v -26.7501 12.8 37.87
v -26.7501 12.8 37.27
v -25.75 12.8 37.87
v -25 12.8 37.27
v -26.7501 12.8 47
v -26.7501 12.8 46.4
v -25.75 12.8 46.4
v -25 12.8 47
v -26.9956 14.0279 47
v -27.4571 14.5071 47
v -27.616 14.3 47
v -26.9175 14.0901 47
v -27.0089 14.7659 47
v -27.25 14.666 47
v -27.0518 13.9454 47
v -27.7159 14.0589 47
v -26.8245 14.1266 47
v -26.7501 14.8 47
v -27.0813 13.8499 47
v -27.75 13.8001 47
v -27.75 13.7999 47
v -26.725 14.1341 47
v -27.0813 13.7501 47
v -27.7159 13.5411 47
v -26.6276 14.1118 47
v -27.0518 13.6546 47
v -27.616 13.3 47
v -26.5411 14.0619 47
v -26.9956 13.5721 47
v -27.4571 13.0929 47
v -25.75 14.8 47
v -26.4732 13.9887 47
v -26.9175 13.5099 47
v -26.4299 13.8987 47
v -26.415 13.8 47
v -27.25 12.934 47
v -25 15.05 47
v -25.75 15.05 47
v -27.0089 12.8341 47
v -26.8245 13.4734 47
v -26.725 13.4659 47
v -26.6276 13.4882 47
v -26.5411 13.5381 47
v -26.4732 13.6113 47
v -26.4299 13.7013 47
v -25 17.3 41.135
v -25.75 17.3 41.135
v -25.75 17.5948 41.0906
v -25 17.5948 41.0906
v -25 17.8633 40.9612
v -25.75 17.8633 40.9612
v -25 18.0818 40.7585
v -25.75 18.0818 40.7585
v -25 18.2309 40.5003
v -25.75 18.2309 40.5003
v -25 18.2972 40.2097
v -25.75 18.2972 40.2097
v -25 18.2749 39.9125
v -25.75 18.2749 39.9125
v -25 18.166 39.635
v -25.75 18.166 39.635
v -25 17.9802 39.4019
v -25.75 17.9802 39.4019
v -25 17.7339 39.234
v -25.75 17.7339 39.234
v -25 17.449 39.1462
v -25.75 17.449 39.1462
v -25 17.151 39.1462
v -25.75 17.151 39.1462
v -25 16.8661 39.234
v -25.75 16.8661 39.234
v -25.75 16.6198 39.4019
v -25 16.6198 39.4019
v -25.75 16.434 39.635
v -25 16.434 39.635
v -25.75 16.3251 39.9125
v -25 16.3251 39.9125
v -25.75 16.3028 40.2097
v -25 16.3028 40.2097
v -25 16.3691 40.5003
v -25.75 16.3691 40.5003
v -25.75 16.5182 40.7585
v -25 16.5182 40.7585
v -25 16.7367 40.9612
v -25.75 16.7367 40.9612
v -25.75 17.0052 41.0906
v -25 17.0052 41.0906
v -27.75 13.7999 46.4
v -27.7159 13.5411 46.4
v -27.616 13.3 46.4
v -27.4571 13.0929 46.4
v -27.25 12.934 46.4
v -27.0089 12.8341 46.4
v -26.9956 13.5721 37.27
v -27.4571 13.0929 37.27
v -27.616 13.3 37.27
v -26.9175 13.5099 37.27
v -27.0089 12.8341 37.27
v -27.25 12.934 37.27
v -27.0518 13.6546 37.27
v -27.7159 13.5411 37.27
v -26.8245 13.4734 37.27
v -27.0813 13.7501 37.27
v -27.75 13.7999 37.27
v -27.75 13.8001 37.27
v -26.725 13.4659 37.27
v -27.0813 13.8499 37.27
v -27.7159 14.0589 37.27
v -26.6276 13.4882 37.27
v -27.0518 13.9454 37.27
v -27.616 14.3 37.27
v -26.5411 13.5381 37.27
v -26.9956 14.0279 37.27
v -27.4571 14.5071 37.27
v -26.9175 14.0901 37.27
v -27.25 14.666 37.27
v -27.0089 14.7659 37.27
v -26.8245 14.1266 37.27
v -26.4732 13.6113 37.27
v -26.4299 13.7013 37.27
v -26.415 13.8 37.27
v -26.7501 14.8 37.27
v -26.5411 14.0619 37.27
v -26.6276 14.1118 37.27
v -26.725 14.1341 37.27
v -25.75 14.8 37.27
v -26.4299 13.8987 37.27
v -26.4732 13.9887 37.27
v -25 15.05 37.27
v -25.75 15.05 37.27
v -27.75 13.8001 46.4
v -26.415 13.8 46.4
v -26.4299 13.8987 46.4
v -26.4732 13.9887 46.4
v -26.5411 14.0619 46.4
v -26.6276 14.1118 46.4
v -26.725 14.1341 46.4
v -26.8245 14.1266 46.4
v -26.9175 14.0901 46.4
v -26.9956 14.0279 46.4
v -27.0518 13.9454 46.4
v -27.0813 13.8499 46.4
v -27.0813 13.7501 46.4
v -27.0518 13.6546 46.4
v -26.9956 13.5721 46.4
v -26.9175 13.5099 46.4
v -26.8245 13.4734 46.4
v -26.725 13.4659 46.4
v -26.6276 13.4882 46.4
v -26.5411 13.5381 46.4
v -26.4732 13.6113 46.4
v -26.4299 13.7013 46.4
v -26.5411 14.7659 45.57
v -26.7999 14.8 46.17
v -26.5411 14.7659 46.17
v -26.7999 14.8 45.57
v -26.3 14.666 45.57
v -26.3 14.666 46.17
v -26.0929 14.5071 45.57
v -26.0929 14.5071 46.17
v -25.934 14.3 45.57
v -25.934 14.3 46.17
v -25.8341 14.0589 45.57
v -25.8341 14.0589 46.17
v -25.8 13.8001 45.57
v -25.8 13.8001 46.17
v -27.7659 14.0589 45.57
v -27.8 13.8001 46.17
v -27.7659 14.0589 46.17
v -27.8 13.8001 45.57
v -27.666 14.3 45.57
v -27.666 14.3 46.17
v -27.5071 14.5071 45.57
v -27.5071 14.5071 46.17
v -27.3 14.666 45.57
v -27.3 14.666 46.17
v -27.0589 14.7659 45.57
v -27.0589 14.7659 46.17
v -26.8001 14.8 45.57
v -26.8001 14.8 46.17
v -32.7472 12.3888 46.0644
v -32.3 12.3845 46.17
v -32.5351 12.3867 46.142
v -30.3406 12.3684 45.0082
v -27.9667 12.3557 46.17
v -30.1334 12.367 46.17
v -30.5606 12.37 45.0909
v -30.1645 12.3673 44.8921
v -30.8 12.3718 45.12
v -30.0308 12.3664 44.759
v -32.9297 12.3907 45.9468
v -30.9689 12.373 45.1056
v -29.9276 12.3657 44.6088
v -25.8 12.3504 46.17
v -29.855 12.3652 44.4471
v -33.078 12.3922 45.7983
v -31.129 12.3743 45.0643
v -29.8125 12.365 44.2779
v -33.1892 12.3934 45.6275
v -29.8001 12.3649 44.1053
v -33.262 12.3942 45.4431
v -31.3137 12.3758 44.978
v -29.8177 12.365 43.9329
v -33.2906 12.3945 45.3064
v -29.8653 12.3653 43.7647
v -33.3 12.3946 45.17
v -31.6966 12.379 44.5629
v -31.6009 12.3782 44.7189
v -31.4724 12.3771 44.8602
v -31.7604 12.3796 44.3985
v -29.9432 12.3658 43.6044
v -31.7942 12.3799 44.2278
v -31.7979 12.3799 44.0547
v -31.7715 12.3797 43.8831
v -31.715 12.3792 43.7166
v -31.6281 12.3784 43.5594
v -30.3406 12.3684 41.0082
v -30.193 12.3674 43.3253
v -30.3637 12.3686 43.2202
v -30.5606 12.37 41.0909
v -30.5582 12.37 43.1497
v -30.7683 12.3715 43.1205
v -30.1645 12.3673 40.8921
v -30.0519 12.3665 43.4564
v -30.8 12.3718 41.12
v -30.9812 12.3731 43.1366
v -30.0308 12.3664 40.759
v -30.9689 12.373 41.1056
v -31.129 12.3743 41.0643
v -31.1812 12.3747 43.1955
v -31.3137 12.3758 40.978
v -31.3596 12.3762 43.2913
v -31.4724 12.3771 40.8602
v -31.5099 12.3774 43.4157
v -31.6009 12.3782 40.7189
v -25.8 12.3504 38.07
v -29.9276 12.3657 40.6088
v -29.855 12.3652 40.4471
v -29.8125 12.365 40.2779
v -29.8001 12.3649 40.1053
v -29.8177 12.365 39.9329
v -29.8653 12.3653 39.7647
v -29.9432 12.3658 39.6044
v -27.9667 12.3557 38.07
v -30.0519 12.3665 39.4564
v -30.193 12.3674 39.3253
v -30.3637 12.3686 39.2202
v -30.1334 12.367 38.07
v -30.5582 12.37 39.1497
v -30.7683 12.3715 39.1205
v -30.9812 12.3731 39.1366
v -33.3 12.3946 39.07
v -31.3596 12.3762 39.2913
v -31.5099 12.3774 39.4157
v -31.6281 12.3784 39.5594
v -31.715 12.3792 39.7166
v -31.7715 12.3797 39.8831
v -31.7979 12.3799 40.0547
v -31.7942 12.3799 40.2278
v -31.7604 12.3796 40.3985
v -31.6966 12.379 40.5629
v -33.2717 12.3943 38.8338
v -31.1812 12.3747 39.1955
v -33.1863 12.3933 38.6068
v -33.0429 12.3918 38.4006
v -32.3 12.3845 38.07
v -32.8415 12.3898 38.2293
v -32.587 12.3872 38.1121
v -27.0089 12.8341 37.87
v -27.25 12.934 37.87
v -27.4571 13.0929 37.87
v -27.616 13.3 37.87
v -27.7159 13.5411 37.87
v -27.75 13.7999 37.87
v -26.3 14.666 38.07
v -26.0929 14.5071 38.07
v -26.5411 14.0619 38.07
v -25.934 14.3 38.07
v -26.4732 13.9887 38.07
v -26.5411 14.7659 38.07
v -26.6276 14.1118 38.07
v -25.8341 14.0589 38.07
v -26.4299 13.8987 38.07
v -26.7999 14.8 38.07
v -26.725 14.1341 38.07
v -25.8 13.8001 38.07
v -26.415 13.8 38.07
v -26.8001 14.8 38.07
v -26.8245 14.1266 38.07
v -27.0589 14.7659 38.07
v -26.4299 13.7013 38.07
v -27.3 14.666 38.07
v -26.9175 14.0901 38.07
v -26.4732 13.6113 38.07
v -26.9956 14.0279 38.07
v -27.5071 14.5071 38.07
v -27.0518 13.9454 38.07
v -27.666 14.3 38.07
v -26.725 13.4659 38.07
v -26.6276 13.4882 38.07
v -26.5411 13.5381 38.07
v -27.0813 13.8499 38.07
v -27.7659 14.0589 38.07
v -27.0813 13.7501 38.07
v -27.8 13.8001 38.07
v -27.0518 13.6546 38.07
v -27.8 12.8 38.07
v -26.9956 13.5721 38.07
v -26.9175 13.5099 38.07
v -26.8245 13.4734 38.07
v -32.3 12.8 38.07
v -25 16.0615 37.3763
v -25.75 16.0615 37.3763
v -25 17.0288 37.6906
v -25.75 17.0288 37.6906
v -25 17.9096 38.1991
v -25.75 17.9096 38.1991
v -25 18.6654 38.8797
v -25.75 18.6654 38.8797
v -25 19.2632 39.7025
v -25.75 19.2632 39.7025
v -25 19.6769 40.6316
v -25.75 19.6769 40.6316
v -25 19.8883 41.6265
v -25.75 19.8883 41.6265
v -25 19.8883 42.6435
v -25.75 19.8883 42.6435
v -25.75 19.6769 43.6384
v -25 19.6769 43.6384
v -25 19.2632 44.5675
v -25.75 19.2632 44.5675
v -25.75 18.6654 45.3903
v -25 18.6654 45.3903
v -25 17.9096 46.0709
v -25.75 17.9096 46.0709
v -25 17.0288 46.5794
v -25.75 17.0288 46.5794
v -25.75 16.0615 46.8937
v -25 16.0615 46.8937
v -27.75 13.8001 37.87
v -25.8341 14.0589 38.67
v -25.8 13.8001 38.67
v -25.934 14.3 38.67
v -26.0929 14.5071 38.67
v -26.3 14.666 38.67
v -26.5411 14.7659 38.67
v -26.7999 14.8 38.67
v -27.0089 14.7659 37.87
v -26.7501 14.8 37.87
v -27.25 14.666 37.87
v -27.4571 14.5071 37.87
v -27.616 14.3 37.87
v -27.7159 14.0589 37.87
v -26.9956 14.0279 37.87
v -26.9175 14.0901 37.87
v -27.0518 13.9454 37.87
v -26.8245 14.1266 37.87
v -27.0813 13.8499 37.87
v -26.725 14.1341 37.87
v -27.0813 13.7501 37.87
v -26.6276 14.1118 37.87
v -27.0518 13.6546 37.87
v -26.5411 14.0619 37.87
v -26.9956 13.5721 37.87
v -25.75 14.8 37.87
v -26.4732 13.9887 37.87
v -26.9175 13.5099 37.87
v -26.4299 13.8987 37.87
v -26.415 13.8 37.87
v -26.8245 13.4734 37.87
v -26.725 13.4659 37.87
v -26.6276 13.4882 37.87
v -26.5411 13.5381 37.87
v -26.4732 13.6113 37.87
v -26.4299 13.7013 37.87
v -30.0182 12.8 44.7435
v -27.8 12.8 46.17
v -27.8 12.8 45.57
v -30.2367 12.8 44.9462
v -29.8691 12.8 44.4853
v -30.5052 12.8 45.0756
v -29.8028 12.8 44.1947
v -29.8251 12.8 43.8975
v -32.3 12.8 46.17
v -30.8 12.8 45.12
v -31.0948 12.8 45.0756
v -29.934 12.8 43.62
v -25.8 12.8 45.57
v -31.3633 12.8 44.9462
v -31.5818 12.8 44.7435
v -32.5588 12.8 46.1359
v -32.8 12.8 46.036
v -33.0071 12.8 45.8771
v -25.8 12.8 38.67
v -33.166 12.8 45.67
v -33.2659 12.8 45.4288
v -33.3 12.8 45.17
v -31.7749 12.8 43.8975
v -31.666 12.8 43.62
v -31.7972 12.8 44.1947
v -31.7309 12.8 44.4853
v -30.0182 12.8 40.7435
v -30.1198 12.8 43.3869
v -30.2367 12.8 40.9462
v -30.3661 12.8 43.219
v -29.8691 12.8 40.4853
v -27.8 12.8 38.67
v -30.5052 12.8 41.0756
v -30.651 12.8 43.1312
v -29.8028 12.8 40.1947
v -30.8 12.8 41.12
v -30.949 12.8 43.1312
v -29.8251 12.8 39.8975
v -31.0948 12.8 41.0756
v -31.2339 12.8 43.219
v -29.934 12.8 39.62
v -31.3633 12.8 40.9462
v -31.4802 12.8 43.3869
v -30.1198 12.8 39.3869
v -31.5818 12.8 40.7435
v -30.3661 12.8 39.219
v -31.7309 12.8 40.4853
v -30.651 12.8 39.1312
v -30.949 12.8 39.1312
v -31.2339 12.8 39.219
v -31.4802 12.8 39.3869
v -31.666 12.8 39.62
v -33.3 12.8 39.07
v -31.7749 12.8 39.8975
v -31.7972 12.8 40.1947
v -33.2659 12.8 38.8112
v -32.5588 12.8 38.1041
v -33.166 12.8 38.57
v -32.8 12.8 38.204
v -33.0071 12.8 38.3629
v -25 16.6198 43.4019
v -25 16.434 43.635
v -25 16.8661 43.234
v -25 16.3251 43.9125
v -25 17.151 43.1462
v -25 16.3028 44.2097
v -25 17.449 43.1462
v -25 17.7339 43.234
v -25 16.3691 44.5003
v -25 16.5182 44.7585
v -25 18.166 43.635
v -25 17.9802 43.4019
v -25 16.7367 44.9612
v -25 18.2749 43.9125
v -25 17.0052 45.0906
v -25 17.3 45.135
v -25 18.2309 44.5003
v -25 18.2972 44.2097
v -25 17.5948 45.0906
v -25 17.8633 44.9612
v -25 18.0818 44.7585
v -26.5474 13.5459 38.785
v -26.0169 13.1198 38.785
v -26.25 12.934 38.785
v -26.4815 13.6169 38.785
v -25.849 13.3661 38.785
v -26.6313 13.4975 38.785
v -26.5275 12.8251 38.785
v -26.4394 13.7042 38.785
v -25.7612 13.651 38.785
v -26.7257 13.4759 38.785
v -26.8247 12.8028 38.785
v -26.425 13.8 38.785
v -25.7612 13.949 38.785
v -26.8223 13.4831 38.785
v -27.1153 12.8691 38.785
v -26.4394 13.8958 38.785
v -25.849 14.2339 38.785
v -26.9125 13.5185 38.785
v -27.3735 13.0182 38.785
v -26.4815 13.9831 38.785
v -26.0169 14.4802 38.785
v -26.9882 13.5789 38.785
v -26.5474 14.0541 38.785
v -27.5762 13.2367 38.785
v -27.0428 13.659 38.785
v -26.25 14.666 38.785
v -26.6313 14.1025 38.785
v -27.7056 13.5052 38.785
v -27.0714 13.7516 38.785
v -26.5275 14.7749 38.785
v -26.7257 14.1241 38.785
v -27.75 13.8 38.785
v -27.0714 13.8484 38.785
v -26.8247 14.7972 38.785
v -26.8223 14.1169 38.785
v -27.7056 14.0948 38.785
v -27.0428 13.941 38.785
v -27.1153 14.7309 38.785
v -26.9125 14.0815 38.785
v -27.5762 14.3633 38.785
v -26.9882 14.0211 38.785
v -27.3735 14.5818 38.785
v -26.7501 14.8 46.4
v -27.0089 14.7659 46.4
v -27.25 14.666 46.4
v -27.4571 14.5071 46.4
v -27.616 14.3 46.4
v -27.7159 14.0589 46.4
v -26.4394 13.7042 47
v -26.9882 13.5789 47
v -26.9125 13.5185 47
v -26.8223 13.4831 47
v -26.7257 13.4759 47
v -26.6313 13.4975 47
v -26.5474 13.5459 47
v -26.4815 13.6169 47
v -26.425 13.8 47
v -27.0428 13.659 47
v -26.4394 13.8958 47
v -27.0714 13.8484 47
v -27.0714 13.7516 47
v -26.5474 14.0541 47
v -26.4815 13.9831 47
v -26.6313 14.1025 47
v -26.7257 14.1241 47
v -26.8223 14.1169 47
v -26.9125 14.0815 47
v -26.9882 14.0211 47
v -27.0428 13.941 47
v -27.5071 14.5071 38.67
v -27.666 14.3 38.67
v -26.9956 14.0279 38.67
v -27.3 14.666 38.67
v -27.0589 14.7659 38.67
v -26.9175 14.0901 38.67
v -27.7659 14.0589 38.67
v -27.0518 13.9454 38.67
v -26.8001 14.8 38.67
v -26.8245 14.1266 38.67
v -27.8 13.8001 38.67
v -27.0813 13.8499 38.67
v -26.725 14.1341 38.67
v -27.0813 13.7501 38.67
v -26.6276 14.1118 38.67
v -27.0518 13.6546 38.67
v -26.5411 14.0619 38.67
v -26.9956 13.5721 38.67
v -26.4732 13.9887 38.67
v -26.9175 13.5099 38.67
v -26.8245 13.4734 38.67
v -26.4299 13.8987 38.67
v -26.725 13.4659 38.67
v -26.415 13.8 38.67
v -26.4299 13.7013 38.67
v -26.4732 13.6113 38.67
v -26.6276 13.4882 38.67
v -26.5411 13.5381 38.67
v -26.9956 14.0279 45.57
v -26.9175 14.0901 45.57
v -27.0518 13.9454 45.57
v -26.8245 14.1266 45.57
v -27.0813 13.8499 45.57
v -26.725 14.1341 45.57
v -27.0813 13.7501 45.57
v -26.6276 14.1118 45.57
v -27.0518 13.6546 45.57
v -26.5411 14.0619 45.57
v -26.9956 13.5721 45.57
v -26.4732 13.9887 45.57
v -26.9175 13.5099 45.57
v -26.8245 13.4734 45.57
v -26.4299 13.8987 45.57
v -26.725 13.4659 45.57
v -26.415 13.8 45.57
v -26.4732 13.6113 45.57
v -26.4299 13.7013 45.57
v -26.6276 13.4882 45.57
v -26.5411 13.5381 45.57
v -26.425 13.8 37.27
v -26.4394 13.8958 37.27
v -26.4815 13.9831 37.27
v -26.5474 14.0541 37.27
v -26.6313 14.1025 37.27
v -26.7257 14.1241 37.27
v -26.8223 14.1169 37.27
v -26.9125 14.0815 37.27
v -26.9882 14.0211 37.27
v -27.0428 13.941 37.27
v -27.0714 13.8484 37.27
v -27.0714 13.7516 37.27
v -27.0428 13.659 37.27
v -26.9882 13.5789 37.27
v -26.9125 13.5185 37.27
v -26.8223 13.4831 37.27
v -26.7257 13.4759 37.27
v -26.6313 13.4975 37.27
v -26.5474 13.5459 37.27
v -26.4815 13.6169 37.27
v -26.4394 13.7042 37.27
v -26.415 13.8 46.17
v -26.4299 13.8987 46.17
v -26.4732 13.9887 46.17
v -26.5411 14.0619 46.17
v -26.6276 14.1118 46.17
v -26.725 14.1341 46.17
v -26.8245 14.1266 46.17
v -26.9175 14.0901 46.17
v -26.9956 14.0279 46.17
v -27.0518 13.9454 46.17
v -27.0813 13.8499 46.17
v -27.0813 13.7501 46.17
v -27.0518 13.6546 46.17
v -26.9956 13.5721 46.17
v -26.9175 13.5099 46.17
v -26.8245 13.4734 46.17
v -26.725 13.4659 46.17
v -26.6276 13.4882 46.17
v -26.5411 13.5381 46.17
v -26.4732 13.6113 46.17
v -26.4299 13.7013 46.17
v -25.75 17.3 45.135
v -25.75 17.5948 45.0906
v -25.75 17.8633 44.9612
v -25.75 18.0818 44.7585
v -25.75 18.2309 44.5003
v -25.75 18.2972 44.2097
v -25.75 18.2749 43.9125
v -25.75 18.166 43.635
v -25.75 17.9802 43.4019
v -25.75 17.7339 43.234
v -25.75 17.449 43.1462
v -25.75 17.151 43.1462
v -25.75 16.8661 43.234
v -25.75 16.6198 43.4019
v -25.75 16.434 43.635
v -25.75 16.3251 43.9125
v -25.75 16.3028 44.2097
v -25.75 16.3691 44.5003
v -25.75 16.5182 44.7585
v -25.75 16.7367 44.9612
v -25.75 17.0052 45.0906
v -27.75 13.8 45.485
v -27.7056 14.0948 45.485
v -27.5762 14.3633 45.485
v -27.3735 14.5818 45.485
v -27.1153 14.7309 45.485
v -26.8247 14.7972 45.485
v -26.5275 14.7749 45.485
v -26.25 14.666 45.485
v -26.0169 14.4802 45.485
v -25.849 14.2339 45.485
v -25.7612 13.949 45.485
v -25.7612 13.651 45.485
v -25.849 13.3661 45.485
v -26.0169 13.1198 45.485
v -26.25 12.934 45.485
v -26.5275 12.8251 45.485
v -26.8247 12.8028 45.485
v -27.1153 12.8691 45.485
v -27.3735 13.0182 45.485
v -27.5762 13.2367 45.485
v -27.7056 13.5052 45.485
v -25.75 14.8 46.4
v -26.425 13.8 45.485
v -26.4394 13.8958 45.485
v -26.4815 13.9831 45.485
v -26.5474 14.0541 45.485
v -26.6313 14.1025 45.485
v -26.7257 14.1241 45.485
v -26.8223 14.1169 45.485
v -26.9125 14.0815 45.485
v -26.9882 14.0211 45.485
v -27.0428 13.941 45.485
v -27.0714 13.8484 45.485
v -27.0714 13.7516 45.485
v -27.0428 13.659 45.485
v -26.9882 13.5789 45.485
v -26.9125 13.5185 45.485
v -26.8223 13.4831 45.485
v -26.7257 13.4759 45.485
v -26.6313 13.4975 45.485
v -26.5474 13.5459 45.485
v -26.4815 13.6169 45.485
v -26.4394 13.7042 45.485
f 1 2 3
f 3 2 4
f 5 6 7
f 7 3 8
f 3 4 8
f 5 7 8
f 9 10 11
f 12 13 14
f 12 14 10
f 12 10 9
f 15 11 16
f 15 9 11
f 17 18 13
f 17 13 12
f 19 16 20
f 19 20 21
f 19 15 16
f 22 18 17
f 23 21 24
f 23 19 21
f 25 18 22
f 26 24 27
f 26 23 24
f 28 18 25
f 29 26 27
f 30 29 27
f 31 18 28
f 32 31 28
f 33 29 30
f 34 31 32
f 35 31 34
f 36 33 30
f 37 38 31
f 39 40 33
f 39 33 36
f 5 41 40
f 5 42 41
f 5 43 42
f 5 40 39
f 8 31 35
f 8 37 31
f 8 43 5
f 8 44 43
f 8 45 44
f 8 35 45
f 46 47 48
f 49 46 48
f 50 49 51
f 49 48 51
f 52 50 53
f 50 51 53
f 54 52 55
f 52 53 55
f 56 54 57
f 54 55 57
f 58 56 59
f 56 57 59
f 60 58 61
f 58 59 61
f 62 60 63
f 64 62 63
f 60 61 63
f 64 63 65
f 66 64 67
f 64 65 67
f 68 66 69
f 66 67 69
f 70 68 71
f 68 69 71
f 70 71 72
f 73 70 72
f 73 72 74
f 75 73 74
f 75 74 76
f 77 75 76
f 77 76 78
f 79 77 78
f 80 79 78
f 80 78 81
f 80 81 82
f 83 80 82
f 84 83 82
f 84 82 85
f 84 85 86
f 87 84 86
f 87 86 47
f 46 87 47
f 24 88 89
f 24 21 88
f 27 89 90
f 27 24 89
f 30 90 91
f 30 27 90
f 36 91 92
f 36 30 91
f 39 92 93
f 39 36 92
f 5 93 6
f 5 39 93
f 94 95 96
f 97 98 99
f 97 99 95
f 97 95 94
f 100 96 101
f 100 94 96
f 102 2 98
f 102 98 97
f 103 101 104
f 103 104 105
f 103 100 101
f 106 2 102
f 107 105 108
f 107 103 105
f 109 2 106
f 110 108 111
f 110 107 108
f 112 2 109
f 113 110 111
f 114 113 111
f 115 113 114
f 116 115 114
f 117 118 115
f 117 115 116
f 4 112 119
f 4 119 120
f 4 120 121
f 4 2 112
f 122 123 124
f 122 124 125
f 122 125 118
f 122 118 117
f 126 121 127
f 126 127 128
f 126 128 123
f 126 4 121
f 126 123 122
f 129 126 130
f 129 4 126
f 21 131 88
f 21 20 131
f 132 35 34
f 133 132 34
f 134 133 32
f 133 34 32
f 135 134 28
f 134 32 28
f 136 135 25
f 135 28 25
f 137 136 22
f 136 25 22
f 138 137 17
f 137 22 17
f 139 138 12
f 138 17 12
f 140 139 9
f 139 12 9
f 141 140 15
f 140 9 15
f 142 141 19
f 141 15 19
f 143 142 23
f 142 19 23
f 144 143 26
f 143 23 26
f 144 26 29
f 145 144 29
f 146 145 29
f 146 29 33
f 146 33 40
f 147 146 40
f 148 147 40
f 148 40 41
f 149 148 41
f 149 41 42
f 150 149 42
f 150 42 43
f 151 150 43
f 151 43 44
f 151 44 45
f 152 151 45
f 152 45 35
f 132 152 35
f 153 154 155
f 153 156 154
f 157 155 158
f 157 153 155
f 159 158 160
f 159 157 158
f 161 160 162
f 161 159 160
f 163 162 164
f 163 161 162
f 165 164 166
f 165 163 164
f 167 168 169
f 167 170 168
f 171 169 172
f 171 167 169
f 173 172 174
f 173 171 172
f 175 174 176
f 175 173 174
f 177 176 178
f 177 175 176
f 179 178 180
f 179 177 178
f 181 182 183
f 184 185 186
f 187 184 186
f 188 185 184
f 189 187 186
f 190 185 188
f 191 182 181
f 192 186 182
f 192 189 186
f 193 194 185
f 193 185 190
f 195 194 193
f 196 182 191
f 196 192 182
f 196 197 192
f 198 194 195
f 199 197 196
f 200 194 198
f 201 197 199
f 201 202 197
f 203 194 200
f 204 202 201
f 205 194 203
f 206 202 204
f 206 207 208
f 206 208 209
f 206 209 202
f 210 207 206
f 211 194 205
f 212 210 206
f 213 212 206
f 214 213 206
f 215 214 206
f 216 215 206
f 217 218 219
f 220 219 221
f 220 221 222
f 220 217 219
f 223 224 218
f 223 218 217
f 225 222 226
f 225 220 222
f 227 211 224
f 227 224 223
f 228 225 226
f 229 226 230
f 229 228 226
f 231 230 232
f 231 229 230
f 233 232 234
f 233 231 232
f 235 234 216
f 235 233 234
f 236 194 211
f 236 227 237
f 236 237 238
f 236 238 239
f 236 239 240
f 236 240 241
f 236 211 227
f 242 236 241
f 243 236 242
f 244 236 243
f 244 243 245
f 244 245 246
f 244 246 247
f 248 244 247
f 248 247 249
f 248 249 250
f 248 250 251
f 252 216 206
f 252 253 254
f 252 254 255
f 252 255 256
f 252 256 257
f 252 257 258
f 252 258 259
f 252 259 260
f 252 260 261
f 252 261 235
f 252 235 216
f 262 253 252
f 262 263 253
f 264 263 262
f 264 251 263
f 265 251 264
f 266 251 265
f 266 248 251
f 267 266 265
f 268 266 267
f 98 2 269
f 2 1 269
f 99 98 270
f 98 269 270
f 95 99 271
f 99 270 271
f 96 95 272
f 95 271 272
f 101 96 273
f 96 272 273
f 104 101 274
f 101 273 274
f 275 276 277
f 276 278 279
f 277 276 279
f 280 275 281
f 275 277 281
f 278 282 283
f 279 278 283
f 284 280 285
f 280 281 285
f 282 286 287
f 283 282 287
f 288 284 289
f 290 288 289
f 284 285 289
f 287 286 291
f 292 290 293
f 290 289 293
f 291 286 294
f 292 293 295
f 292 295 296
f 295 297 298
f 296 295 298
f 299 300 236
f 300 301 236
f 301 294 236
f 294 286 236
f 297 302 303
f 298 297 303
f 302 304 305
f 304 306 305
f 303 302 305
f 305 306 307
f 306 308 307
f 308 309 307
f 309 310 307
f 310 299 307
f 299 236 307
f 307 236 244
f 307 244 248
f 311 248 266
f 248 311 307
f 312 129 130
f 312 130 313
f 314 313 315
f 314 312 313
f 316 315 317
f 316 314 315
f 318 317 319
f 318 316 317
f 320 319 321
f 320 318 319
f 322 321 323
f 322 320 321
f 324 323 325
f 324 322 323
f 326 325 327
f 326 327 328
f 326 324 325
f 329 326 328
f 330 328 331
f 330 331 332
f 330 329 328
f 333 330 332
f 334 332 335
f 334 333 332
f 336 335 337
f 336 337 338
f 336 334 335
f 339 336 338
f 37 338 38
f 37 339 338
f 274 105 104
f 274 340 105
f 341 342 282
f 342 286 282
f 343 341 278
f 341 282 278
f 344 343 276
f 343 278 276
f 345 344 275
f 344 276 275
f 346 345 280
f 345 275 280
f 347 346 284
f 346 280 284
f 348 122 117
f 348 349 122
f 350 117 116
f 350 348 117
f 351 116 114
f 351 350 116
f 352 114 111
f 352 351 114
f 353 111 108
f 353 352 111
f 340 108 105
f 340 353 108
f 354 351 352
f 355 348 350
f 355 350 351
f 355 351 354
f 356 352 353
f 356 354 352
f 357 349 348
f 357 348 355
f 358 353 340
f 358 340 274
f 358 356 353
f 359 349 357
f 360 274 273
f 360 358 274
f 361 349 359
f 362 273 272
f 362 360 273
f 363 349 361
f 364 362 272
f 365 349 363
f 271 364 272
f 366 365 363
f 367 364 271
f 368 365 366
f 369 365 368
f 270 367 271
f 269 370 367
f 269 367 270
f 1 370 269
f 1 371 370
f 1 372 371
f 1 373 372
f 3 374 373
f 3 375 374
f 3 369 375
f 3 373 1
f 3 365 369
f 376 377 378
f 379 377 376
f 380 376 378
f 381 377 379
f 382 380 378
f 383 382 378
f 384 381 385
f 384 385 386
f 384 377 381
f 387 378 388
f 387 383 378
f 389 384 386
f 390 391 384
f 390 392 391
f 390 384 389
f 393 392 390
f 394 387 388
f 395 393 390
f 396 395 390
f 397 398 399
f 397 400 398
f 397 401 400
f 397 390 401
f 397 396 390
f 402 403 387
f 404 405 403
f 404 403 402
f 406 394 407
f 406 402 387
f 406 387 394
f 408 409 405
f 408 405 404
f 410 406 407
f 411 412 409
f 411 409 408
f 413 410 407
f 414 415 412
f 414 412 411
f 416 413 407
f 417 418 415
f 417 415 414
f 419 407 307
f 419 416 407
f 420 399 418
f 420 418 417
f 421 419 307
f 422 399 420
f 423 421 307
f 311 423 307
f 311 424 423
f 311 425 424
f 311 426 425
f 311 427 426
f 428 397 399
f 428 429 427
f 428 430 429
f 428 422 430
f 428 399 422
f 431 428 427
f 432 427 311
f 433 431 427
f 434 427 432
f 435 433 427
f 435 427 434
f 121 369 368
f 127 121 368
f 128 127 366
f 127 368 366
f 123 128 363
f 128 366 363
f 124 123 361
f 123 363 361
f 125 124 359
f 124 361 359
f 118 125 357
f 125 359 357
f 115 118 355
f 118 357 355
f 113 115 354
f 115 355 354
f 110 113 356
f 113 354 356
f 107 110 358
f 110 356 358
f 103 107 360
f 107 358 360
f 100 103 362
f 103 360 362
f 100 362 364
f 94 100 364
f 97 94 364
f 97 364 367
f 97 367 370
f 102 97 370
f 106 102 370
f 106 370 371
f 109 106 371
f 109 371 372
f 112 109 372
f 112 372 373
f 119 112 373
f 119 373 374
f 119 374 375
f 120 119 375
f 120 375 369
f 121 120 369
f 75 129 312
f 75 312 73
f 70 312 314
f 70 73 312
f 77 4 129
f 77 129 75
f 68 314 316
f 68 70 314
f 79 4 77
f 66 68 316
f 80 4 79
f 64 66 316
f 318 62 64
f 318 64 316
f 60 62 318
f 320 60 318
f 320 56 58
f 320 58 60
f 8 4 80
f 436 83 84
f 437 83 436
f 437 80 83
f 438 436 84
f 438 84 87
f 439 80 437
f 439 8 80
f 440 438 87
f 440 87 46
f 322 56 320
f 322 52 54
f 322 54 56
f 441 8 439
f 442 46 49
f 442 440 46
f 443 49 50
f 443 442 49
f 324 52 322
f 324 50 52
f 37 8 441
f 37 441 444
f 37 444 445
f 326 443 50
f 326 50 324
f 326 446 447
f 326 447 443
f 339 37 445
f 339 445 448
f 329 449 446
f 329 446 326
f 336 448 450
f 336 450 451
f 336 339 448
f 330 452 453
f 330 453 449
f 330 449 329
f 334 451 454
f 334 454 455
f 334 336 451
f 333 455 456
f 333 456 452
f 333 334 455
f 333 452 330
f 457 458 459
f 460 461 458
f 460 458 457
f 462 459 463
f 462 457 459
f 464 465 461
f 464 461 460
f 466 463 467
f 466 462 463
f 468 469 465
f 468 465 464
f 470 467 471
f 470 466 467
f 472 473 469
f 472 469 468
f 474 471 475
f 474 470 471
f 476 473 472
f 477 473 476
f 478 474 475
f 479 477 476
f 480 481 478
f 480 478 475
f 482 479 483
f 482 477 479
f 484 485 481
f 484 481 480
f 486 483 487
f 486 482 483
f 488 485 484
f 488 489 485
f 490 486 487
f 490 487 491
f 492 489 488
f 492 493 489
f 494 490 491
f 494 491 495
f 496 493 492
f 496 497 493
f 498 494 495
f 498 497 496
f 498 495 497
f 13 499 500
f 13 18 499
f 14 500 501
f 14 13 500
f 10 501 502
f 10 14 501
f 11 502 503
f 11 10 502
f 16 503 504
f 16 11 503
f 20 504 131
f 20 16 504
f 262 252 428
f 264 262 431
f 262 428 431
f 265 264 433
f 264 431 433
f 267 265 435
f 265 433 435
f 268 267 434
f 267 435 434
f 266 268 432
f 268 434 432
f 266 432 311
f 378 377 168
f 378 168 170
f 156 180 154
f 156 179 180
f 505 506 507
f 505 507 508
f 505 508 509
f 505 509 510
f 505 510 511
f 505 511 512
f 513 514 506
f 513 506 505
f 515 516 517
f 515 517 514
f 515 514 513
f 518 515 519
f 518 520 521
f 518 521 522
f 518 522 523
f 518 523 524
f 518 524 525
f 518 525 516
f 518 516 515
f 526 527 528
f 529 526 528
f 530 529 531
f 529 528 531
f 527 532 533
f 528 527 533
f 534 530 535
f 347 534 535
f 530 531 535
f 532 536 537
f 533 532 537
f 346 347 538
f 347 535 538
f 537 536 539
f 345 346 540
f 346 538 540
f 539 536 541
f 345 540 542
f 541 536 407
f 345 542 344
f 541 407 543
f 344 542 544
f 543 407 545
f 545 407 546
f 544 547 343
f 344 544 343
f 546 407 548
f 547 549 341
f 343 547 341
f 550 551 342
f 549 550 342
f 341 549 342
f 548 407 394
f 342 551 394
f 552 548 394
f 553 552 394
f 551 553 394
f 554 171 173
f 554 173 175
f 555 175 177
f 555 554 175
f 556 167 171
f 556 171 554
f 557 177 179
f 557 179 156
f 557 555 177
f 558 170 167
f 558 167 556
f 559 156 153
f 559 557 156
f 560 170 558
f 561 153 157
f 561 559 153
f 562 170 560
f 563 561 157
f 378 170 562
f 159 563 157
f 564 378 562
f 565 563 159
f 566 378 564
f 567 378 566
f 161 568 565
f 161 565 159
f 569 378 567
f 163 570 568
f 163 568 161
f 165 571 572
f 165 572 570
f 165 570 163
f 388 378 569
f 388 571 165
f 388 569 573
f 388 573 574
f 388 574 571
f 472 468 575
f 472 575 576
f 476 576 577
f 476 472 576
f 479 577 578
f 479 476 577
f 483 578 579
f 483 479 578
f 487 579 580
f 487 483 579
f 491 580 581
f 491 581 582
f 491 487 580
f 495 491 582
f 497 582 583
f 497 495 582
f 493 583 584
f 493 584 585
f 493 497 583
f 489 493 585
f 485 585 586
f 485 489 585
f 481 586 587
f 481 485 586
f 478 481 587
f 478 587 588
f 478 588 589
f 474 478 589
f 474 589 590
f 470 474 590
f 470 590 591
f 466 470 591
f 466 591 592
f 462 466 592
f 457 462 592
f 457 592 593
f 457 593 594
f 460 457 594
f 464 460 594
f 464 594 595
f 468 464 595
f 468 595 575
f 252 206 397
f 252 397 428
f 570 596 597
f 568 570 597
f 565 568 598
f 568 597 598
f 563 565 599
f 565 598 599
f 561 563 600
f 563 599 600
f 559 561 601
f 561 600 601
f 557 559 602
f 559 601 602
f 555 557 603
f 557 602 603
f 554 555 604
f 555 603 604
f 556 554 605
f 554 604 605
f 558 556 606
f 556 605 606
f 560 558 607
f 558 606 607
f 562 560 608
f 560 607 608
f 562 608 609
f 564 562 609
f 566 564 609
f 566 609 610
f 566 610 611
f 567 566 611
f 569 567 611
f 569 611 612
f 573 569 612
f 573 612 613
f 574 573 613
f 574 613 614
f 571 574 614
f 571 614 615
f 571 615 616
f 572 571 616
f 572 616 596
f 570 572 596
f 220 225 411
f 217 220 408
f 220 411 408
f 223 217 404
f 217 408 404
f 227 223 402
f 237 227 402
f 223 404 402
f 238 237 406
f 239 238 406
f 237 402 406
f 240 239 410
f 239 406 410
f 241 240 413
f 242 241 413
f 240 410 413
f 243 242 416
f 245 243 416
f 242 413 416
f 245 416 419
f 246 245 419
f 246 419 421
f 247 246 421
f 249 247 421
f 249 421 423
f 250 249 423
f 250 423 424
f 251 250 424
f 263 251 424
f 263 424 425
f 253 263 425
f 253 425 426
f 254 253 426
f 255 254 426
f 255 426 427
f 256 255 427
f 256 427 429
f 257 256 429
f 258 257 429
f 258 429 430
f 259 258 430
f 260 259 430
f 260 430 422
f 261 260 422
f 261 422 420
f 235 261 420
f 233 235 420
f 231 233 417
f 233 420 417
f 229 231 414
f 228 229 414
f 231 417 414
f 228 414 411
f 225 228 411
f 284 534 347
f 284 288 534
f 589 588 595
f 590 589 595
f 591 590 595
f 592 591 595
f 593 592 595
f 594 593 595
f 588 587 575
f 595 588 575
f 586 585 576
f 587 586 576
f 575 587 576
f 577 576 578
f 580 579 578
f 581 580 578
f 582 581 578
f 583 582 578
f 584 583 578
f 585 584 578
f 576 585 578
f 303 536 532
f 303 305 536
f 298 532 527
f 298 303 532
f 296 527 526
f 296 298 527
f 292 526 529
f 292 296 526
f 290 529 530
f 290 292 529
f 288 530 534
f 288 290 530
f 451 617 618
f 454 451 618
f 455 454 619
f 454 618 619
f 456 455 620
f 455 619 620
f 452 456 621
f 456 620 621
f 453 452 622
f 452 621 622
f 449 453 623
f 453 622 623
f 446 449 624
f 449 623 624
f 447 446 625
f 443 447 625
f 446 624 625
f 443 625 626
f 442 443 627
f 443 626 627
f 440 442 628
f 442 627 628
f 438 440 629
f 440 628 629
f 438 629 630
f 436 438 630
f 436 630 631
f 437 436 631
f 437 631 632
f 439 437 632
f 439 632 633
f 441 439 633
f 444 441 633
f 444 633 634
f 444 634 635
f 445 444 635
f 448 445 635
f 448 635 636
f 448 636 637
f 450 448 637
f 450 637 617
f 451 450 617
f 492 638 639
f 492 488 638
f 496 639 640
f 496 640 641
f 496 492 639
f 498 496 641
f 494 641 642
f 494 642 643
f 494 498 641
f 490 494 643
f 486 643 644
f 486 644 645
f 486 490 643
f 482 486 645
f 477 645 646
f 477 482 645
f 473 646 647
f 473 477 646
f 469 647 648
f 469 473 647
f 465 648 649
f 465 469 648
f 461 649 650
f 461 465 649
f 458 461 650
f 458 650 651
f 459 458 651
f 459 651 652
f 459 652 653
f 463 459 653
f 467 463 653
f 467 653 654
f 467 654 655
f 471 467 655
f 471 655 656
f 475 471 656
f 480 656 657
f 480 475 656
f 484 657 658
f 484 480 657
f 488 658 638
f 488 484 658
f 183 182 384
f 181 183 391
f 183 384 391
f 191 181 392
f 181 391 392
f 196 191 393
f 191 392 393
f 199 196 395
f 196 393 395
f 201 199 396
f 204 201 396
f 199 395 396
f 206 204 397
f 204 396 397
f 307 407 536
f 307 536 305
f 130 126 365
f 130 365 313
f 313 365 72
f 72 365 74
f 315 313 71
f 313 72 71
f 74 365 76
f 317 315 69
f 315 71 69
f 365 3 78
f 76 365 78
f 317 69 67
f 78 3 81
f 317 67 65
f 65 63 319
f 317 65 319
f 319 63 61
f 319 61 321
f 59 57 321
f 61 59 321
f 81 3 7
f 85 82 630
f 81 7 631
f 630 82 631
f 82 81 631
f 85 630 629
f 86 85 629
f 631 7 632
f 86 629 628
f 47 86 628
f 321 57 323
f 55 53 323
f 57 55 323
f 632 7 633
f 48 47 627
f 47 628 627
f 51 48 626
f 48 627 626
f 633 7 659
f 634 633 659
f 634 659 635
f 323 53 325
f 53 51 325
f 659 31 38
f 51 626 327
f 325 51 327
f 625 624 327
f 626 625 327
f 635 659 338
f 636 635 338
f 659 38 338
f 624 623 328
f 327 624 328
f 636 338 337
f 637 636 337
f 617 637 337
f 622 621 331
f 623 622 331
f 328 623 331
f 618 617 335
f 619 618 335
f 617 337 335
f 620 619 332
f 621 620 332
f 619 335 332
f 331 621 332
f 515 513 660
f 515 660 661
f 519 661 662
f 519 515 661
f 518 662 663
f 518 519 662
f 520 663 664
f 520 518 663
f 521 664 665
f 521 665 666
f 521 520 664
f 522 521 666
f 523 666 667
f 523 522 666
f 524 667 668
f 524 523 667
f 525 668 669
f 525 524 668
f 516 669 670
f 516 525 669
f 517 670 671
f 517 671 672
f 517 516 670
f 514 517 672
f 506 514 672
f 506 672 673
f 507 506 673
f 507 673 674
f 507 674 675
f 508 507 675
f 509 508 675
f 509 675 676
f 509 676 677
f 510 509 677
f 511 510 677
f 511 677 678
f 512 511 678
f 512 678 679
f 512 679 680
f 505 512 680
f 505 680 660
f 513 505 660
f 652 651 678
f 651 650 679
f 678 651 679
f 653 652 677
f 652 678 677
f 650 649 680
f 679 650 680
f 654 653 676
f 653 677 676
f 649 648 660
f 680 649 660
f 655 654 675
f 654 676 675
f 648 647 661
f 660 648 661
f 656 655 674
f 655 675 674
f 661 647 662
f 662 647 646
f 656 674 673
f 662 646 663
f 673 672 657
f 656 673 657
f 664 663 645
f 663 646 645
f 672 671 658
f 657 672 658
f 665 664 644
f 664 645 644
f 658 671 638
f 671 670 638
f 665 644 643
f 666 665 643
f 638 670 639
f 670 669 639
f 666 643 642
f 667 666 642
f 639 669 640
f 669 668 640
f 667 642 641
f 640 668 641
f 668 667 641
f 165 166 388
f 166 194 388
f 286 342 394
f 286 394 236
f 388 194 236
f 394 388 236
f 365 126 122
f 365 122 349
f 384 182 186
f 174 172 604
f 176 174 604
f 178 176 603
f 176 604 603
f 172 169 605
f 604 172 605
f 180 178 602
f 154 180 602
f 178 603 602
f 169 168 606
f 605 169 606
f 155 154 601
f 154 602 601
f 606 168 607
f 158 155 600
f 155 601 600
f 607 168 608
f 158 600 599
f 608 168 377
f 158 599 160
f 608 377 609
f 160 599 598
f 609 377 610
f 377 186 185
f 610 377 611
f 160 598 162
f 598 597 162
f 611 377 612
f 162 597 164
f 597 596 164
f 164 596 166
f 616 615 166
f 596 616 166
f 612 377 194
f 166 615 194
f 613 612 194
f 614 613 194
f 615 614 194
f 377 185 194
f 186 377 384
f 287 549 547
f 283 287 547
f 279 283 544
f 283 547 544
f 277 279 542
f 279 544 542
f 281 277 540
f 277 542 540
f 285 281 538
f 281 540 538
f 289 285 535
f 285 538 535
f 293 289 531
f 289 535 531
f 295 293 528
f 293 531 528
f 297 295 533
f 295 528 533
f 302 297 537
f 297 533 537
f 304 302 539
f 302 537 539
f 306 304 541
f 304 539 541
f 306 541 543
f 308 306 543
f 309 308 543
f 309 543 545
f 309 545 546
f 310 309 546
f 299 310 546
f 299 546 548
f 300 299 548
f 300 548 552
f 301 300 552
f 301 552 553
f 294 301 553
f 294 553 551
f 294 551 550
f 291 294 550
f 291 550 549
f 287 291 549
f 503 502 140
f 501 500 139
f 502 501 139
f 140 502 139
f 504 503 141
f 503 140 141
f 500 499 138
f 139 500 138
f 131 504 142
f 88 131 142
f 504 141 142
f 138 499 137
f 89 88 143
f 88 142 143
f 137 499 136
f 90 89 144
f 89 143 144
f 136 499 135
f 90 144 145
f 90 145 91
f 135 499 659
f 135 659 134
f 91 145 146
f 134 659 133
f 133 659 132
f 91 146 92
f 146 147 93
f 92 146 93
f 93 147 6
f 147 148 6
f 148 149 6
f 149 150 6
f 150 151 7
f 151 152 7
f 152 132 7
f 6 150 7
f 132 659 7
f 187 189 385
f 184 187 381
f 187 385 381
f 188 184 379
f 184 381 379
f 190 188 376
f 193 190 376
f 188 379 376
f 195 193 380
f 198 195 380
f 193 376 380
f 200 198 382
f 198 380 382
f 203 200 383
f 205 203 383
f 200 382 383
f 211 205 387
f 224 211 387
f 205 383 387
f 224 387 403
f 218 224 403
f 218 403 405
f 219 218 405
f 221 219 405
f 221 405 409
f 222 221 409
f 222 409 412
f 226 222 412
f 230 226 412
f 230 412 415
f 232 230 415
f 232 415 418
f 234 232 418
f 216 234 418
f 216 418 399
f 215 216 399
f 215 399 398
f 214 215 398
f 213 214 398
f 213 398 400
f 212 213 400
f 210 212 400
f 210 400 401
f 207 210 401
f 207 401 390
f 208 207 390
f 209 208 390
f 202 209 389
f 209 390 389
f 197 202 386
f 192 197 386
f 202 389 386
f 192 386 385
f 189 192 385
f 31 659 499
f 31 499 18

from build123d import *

# Parameters (mm, degrees)
BOSS_EXTRUDE1_DEPTH = 0.75
SKETCH2_W           = 2
SKETCH2_H           = 0.6
BOSS_EXTRUDE2_DEPTH = 2
FILLET1_R           = 1
SKETCH4_W           = 8.1
SKETCH4_H           = 7.5
BOSS_EXTRUDE3_DEPTH = 0.449838501
SKETCH6_W           = 2
SKETCH6_H           = 0.6
BOSS_EXTRUDE4_DEPTH = 2
FILLET2_R           = 1
SKETCH8_R           = 0.335
CUT_EXTRUDE1_DEPTH  = 41.002126506
FILLET3_R           = 1
SKETCH9_R           = 0.325
BOSS_EXTRUDE5_DEPTH = 9.73
SKETCH10_R          = 1
BOSS_EXTRUDE6_DEPTH = 3.35
SKETCH13_R          = 1
CUT_EXTRUDE2_DEPTH  = 59.038894071
SKETCH11_R          = 1
CUT_EXTRUDE3_DEPTH  = 52.600481829
CAVITY1_START       = 38.07
CAVITY1_DEPTH       = 8.1


# Read off the part's stored shape, not the designer's step: Cavity1
with BuildPart() as part:
    # Sketch1 → Boss-Extrude1 (new body)
    with BuildSketch(Plane(origin=(-25, 0, 0), x_dir=(0, -1, 0), z_dir=(-1, 0, 0))):
        with BuildLine():
            Line((-15.05, 47), (-12.8, 47))
            Line((-12.8, 47), (-12.8, 37.27))
            Line((-12.8, 37.27), (-15.05, 37.27))
            ThreePointArc((-15.05, 37.27), (-19.915, 42.135), (-15.05, 47))
        make_face()
    extrude(amount=BOSS_EXTRUDE1_DEPTH)

    # Sketch2 → Boss-Extrude2 (add)
    with BuildSketch(Plane(origin=(-25.75, 0, 0), x_dir=(0, -1, 0), z_dir=(-1, 0, 0))):
        with Locations((-13.8, 46.7)):
            Rectangle(SKETCH2_W, SKETCH2_H)
        with Locations((-13.8, 37.57)):
            Rectangle(SKETCH2_W, SKETCH2_H)
    extrude(amount=BOSS_EXTRUDE2_DEPTH)

    # Fillet1
    fillet1_edges = [part.edges().sort_by_distance(p)[0] for p in [
        (-27.75, 14.8, 37.57),
        (-27.75, 12.8, 37.57),
        (-27.75, 14.8, 46.7),
        (-27.75, 12.8, 46.7),
    ]]
    fillet(fillet1_edges, radius=FILLET1_R - 0.0001)  # a hair under: the kernel refuses the full size


with BuildPart() as body_2:
    # Sketch4 → Boss-Extrude3 (new body)
    with BuildSketch(Plane(origin=(0, 12.350161499, 0), x_dir=(0, 0, -1), z_dir=(0, 1, 0))):
        with Locations((-42.12, 29.55)):
            Rectangle(SKETCH4_W, SKETCH4_H)
    extrude(amount=BOSS_EXTRUDE3_DEPTH)

    # Sketch6 → Boss-Extrude4 (add)
    with BuildSketch(Plane(origin=(0, 12.8, 0), x_dir=(1, 0, 0), z_dir=(0, 1, 0))):
        with Locations((-26.8, -45.87)):
            Rectangle(SKETCH6_W, SKETCH6_H)
        with Locations((-26.8, -38.37)):
            Rectangle(SKETCH6_W, SKETCH6_H)
    extrude(amount=BOSS_EXTRUDE4_DEPTH)

    # Fillet2
    fillet2_edges = [body_2.edges().sort_by_distance(p)[0] for p in [
        (-25.8, 14.8, 45.87),
        (-27.8, 14.8, 45.87),
        (-25.8, 14.8, 38.37),
        (-27.8, 14.8, 38.37),
    ]]
    fillet(fillet2_edges, radius=FILLET2_R - 0.0001)  # a hair under: the kernel refuses the full size


with BuildPart() as cut_extrude1_tool:
    # Sketch8 → Cut-Extrude1 (new, through all)
    with BuildSketch(Plane.XY.offset(47)):
        with Locations((-26.75, 13.8)):
            Circle(SKETCH8_R)
    extrude(amount=-CUT_EXTRUDE1_DEPTH)


with BuildPart() as part_1:
    add(part.part)

    # Cut-Extrude1: cut by cut_extrude1_tool
    add(cut_extrude1_tool.part, mode=Mode.SUBTRACT)

    # Sketch11 → Cut-Extrude3 (cut, through all)
    with BuildSketch(Plane(origin=(-25.75, 0, 0), x_dir=(0, -1, 0), z_dir=(-1, 0, 0))):
        with Locations(Location((-17.3, 40.135, 0), (0, 0, 90))):
            Circle(SKETCH11_R)
        with Locations(Location((-17.3, 44.135, 0), (0, 0, 90))):
            Circle(SKETCH11_R)
    extrude(amount=-CUT_EXTRUDE3_DEPTH, mode=Mode.SUBTRACT)


with BuildPart() as body_2_1:
    add(body_2.part)

    # Cut-Extrude1: cut by cut_extrude1_tool
    add(cut_extrude1_tool.part, mode=Mode.SUBTRACT)

    # Fillet3
    fillet3_edges = [body_2_1.edges().sort_by_distance(p)[0] for p in [
        (-33.3, 12.575080749, 38.07),
        (-33.3, 12.575080749, 46.17),
    ]]
    fillet(fillet3_edges, radius=FILLET3_R)

    # Sketch13 → Cut-Extrude2 (cut, through all)
    with BuildSketch(Plane(origin=(0, 12.8, 0), x_dir=(-1, 0, 0), z_dir=(0, 1, 0))):
        with Locations(Location((30.8, 44.12, 0), (0, 0, 90))):
            Circle(SKETCH13_R)
        with Locations(Location((30.8, 40.12, 0), (0, 0, 90))):
            Circle(SKETCH13_R)
    extrude(amount=-CUT_EXTRUDE2_DEPTH, mode=Mode.SUBTRACT)

    # Cavity1 outline → Cavity1 (cut)
    with BuildSketch(Plane.XY.offset(CAVITY1_START)):
        with BuildLine():
            ThreePointArc((-25.8, 12.350413972), (-29.550054299, 12.363391445), (-33.300001511, 12.394561456))
            Line((-33.300001511, 12.394561456), (-33.3, 12.350161499))
            Line((-33.3, 12.350161499), (-25.8, 12.350161499))
            Line((-25.8, 12.350161499), (-25.8, 12.350413972))
        make_face()
    extrude(amount=CAVITY1_DEPTH, mode=Mode.SUBTRACT)


with BuildPart() as body_3:
    # Sketch9 → Boss-Extrude5 (new body)
    with BuildSketch(Plane.XY.offset(47)):
        with Locations((-26.75, 13.8)):
            Circle(SKETCH9_R)
    extrude(amount=-BOSS_EXTRUDE5_DEPTH)

    # Sketch10 → Boss-Extrude6 (add, symmetric)
    with BuildSketch(Plane(origin=(0, 0, 42.135), x_dir=(-1, 0, 0), z_dir=(0, 0, -1))):
        with Locations((26.75, 13.8)):
            Circle(SKETCH10_R)
    extrude(amount=BOSS_EXTRUDE6_DEPTH, both=True)


solid = Compound([part_1.part, body_2_1.part, body_3.part])
